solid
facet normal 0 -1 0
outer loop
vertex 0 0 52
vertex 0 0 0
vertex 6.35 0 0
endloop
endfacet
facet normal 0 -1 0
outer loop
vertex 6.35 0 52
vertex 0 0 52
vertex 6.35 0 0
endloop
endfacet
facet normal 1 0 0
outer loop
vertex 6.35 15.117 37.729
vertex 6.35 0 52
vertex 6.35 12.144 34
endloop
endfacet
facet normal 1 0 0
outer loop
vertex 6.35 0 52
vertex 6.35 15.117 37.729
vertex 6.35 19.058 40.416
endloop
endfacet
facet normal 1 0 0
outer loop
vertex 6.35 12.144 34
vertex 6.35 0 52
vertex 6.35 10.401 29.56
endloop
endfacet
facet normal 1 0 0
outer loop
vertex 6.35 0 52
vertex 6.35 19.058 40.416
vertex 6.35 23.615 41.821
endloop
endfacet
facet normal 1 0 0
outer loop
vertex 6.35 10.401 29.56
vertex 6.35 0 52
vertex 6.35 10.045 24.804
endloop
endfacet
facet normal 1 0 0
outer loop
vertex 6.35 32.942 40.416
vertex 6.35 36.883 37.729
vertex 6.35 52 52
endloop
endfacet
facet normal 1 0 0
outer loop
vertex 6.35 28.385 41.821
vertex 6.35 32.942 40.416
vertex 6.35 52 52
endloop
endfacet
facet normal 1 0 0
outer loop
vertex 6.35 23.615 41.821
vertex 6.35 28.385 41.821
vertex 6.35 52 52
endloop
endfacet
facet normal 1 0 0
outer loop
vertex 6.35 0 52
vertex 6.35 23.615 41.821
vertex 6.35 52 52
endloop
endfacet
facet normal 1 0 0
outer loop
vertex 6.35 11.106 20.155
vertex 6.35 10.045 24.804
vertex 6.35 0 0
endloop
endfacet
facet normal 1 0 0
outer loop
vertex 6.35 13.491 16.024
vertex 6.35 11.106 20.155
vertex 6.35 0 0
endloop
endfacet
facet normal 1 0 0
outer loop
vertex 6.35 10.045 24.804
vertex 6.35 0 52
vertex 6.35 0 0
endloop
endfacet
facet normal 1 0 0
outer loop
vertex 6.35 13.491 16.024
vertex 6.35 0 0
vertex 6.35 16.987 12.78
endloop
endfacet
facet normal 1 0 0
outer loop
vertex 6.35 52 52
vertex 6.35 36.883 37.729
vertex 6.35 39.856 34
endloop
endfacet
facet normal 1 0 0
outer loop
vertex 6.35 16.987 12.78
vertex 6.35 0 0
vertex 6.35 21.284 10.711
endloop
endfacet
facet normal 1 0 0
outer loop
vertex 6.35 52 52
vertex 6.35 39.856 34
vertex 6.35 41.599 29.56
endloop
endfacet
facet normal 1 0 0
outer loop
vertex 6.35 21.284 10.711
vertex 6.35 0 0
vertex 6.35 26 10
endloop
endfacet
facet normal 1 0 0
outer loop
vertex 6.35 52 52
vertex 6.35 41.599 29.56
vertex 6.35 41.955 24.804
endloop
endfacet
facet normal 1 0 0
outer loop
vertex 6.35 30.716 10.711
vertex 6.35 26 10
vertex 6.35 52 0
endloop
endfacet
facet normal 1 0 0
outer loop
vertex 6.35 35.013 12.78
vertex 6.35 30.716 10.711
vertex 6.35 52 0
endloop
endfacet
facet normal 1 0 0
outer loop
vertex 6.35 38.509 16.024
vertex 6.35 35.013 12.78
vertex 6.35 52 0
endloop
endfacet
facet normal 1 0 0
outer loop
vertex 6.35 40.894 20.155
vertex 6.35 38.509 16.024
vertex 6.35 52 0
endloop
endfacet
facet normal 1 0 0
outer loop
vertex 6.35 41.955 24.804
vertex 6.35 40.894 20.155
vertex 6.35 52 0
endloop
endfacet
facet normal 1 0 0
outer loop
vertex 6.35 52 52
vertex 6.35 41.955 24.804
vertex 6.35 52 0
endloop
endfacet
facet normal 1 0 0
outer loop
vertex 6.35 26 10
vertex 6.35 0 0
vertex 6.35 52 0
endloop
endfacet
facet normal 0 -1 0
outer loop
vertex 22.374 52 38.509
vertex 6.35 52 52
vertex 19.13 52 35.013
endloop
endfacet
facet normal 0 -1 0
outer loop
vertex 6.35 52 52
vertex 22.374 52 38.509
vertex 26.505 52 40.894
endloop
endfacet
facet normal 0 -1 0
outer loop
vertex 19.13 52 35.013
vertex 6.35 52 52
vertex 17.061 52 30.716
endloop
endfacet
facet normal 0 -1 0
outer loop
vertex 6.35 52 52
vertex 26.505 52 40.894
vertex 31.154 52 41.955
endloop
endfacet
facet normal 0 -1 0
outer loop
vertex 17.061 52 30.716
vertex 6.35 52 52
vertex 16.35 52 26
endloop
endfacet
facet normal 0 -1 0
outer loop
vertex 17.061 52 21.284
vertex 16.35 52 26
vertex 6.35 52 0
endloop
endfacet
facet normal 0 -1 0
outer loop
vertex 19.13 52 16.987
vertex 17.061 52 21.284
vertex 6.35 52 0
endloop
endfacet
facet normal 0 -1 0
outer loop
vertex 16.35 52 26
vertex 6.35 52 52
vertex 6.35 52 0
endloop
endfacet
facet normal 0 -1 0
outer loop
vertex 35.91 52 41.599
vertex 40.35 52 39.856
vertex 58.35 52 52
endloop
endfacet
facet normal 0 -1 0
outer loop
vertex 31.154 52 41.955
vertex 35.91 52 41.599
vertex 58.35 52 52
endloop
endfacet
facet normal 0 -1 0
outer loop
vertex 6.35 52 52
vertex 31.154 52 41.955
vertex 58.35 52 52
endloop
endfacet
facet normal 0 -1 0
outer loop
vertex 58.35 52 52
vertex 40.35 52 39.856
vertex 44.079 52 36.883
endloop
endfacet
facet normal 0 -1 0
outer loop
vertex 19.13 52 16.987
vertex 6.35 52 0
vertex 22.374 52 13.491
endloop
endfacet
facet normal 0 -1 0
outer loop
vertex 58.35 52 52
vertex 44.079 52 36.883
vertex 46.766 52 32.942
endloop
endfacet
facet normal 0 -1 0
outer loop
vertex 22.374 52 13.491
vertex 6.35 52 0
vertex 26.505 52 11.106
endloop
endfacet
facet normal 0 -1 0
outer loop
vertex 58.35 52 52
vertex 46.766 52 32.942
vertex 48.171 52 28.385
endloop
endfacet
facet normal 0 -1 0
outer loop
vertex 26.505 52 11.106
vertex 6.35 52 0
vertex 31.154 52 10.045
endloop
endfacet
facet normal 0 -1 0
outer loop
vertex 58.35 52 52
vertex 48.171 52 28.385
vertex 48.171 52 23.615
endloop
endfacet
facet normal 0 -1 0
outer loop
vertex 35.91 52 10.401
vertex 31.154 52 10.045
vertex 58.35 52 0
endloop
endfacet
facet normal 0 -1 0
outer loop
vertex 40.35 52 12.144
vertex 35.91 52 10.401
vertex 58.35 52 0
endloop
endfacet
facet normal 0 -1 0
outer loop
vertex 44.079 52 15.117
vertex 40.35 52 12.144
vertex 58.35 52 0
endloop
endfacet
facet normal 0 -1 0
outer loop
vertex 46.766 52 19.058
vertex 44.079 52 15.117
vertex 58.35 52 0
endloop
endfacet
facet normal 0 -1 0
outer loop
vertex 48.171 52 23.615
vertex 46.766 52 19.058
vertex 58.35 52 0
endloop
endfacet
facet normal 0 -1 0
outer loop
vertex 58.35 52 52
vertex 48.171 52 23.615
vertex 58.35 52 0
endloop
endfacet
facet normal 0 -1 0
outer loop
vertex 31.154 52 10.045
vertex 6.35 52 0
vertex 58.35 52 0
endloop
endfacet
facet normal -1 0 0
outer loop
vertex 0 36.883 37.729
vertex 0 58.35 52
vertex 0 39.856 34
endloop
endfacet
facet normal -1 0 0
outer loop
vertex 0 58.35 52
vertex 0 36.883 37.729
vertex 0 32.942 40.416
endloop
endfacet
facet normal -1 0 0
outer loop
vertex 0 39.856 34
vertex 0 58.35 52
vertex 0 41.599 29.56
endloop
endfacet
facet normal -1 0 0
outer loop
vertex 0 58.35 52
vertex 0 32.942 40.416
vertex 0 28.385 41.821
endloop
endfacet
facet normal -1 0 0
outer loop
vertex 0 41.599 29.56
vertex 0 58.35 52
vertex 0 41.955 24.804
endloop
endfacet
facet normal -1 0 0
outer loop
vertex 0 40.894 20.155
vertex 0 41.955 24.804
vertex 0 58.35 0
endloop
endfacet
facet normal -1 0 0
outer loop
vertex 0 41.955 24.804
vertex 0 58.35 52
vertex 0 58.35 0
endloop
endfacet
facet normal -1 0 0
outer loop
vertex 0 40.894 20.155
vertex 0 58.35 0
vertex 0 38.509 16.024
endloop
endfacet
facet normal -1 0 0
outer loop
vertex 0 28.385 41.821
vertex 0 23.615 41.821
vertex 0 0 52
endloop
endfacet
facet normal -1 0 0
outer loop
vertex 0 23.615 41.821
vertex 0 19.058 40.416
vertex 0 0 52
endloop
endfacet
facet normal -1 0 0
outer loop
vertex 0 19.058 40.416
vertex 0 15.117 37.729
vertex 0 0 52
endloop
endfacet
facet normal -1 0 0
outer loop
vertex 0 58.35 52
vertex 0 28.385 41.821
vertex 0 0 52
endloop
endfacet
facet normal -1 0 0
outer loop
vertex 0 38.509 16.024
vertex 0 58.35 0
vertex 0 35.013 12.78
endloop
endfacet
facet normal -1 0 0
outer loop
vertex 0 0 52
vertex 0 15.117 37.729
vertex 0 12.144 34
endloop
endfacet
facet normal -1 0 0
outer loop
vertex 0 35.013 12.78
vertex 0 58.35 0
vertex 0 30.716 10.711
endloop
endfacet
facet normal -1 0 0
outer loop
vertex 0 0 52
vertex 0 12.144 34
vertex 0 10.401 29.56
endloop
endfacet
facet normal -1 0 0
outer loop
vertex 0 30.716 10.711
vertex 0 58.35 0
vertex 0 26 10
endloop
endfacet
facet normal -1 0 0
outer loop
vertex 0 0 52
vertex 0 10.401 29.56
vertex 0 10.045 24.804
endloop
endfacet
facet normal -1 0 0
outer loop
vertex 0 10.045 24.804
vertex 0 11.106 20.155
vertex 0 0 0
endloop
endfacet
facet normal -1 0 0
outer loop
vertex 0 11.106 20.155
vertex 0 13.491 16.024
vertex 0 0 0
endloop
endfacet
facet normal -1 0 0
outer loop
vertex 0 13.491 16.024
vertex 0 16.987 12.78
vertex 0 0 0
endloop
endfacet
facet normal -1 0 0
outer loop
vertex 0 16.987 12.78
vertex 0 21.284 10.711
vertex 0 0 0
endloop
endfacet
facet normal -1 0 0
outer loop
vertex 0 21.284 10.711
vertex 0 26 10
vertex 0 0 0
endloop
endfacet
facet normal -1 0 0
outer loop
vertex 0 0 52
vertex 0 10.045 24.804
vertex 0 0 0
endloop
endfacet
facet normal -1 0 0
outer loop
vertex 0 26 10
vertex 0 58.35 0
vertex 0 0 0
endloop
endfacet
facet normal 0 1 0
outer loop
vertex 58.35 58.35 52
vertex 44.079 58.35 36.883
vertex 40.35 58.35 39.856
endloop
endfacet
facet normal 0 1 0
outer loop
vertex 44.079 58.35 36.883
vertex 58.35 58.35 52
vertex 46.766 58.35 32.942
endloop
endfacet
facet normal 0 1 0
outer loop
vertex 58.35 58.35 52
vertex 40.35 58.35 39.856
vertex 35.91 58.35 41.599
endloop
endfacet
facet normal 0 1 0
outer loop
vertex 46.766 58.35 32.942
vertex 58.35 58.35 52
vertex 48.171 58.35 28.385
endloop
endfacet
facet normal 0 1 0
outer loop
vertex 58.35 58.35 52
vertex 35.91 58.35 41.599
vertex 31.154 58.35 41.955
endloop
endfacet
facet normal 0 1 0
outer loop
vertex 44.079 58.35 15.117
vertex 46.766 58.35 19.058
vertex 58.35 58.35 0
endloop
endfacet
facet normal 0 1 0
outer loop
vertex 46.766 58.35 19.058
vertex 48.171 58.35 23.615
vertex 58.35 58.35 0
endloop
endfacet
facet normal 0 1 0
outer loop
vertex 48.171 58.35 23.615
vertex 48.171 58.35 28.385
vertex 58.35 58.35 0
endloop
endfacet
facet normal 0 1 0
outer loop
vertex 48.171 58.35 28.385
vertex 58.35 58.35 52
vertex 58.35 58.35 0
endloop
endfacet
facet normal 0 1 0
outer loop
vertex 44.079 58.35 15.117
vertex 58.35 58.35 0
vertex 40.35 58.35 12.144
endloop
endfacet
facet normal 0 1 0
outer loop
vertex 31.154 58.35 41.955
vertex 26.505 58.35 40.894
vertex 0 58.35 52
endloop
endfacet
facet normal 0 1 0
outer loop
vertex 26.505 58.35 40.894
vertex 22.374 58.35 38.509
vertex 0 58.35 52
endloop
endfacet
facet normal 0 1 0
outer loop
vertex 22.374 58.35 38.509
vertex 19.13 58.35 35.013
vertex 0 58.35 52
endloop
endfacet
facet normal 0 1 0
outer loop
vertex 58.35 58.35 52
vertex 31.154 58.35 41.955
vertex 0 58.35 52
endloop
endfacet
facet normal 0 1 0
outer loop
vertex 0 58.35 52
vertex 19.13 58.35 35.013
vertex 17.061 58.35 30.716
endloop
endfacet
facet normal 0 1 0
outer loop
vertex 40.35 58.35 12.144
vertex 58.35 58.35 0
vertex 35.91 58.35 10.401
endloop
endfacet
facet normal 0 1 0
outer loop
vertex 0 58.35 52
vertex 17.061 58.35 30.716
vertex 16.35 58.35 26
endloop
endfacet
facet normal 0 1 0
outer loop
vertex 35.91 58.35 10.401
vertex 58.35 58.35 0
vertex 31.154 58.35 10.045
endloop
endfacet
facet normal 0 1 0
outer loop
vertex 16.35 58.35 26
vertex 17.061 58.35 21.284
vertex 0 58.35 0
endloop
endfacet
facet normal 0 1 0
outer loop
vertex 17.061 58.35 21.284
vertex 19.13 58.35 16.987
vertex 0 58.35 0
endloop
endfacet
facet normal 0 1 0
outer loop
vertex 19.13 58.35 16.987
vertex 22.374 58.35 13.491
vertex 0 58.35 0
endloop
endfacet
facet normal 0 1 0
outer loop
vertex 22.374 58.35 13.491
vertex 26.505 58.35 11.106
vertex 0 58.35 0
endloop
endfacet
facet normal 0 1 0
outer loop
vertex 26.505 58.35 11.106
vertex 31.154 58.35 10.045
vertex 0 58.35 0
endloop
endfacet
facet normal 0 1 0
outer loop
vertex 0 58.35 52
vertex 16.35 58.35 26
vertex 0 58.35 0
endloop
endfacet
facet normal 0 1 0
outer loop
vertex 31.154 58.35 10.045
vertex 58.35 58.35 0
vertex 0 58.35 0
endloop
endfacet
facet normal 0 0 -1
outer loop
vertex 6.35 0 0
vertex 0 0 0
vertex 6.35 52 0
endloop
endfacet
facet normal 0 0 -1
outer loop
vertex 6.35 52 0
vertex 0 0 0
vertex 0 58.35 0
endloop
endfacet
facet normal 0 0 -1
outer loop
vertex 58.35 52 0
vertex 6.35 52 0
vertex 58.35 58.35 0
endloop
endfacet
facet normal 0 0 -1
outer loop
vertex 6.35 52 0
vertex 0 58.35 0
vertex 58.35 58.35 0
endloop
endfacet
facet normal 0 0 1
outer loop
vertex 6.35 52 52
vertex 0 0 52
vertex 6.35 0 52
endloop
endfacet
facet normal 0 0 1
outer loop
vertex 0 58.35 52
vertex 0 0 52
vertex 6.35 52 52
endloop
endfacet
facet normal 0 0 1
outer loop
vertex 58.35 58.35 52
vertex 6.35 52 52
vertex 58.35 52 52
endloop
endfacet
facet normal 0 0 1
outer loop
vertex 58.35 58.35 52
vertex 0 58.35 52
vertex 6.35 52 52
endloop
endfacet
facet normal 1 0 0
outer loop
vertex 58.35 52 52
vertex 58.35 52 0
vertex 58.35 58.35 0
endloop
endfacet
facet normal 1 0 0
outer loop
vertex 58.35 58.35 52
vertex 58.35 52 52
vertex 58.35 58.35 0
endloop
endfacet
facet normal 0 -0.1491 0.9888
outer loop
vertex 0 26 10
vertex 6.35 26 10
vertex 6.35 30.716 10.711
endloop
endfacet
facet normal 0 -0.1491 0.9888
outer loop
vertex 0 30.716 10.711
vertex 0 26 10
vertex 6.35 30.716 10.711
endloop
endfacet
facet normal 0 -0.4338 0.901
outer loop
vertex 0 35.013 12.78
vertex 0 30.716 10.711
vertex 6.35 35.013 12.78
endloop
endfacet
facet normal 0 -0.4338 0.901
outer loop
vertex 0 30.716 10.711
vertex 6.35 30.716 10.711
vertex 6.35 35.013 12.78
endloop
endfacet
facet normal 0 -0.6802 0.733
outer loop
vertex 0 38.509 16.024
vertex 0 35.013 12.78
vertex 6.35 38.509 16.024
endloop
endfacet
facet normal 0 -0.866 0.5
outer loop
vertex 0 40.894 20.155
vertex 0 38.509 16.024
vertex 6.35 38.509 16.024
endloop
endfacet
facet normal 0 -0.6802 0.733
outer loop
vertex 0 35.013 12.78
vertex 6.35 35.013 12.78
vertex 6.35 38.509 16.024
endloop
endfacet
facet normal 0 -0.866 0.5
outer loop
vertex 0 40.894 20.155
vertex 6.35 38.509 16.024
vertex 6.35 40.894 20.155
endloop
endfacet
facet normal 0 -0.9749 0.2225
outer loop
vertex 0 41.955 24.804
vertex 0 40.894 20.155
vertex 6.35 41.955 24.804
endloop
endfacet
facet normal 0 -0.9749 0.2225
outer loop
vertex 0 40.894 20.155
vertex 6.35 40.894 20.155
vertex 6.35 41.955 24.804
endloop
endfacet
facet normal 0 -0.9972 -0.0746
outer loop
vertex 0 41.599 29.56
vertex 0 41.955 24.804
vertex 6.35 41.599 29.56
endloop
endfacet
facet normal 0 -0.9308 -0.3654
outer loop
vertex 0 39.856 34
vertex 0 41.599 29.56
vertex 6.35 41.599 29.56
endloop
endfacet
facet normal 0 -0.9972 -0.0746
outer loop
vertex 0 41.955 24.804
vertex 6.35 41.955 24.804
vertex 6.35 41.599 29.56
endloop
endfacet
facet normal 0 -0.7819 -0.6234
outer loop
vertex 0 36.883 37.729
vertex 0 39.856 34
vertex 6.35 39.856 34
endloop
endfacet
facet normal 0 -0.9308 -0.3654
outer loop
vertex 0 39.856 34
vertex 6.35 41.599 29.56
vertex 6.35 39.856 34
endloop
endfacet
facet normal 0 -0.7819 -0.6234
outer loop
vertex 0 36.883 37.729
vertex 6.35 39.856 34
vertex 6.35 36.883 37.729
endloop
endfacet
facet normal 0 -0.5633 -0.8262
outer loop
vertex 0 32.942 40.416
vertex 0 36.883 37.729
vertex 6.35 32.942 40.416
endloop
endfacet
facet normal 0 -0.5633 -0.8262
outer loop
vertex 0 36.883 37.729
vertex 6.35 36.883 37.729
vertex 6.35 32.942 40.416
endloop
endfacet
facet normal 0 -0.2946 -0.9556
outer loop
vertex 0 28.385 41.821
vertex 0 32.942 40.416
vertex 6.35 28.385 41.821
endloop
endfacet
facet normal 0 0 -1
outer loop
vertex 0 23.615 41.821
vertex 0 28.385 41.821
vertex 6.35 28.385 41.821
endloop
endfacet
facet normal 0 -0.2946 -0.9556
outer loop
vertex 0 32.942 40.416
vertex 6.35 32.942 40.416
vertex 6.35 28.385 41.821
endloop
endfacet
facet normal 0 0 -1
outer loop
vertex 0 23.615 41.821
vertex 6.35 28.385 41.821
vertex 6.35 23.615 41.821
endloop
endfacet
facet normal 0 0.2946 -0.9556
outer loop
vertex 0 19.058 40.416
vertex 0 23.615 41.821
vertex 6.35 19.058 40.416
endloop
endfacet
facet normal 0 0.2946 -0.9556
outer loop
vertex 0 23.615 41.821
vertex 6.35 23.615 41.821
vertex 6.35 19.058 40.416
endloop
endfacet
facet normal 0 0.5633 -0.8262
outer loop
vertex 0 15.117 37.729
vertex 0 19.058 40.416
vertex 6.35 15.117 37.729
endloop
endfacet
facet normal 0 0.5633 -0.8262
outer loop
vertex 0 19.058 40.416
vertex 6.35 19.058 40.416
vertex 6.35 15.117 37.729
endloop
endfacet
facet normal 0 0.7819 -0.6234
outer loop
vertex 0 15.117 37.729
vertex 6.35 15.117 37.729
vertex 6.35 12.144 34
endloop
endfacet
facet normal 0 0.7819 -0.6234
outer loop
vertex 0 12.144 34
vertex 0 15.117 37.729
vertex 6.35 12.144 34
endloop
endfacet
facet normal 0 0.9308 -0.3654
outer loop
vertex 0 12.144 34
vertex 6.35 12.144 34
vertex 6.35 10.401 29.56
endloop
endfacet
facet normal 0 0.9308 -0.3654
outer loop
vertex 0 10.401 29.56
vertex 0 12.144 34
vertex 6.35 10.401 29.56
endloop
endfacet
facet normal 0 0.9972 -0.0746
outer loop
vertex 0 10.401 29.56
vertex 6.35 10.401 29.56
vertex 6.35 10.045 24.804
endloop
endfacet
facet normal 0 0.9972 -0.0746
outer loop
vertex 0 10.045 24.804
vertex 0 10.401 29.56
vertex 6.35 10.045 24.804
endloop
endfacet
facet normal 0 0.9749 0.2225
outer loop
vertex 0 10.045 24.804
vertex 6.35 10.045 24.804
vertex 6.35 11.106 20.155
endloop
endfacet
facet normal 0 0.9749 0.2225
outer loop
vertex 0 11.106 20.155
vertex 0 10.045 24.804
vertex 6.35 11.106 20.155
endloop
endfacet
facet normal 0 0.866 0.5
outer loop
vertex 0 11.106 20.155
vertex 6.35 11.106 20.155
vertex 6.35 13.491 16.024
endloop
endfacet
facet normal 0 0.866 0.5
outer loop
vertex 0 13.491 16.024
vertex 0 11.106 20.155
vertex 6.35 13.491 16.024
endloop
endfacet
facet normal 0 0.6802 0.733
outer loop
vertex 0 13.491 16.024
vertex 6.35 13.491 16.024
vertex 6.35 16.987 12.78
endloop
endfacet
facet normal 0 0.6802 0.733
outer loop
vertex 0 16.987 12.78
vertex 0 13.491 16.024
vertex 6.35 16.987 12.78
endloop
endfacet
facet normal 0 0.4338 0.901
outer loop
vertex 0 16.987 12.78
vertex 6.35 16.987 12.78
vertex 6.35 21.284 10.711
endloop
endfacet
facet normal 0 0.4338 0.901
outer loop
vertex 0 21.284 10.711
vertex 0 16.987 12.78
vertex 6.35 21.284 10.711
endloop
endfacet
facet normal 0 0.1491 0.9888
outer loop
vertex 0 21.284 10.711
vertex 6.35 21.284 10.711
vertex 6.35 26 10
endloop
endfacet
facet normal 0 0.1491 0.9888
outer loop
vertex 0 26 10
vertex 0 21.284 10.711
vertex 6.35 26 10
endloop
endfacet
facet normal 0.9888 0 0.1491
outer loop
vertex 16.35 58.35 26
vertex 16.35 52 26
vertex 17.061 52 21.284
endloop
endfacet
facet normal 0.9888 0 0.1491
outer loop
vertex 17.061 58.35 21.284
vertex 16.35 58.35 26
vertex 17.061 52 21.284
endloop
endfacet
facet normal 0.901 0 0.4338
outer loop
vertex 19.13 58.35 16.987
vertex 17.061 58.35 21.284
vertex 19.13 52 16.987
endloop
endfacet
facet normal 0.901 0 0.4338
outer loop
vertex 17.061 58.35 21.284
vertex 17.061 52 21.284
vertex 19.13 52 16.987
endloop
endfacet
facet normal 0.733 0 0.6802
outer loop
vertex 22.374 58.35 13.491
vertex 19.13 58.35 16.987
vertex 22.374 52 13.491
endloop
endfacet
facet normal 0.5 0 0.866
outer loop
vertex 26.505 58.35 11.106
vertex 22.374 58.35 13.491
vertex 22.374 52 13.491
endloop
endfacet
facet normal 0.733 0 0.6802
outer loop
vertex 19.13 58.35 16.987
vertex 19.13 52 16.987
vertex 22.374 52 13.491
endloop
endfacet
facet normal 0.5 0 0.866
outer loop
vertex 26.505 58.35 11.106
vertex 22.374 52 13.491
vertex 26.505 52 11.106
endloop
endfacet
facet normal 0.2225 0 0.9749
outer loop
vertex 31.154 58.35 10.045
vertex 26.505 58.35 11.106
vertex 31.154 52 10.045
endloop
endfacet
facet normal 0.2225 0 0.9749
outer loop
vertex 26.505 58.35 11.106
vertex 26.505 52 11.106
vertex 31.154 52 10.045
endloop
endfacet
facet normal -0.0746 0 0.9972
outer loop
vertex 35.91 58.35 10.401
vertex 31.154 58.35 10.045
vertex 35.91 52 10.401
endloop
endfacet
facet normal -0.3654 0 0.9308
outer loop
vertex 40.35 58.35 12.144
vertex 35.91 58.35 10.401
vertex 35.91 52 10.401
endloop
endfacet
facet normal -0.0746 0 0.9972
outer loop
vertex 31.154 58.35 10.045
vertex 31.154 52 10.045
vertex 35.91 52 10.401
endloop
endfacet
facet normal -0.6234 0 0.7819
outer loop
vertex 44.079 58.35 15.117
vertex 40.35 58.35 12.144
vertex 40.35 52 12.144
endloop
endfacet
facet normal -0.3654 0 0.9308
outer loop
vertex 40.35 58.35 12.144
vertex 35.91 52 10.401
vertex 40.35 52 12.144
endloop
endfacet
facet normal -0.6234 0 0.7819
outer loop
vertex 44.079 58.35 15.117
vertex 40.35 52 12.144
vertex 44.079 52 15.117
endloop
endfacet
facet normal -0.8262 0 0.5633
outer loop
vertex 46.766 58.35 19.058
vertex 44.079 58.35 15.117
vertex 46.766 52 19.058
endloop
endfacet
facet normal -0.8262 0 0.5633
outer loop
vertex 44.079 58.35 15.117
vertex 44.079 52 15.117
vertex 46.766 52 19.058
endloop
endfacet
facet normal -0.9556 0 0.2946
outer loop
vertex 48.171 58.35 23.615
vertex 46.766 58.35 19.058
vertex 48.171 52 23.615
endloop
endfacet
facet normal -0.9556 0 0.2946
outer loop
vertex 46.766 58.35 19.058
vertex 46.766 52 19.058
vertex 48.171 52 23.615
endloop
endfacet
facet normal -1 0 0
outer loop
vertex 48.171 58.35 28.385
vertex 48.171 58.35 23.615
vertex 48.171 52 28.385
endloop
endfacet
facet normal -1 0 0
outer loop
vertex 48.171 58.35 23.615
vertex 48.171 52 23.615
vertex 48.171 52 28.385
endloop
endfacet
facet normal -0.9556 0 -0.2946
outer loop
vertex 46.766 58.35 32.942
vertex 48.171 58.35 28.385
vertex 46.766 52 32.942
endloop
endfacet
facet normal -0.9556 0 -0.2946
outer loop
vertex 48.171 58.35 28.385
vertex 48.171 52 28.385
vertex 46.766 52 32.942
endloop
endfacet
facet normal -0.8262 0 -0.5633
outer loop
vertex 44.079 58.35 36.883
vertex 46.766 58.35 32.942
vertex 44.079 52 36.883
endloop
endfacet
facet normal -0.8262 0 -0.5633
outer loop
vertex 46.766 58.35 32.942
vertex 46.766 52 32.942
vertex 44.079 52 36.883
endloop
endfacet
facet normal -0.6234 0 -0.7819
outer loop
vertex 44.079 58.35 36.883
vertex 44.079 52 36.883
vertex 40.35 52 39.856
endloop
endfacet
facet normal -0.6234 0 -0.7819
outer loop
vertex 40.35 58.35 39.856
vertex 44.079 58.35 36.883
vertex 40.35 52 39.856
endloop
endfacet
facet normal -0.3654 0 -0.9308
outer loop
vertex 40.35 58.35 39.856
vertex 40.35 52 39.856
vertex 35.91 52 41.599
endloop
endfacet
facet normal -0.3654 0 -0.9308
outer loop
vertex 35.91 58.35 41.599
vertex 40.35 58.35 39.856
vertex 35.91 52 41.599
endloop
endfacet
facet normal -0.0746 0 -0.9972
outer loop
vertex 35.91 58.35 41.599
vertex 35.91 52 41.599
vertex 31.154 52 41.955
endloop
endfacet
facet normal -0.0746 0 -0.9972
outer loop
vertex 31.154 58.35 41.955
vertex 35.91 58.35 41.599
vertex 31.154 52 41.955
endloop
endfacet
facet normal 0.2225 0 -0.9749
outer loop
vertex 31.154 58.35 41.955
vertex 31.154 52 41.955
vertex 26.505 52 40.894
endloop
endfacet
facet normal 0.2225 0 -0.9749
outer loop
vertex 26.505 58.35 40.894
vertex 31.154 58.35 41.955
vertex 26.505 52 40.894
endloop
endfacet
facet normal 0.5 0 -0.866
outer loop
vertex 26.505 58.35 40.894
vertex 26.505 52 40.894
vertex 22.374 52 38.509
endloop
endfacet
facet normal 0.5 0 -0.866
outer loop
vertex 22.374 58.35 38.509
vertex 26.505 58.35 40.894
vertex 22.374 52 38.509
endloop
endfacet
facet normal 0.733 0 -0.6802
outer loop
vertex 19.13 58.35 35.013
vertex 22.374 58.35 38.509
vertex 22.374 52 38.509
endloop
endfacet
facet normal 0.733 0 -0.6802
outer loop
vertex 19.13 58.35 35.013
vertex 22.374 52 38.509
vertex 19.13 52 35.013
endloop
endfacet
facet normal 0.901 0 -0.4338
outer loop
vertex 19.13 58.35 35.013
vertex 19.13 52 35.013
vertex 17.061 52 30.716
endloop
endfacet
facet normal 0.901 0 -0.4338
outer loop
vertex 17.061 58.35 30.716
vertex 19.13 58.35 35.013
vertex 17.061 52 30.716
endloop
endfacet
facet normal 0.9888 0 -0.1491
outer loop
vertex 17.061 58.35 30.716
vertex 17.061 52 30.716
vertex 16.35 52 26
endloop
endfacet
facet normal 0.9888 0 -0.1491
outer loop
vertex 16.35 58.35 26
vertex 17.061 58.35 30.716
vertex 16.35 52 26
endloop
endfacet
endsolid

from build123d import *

# Parameters (mm, degrees)
BOSS_EXTRUDE1_DEPTH = 52
SKETCH2_R           = 16
CUT_EXTRUDE1_DEPTH  = 52
SKETCH3_R           = 16
CUT_EXTRUDE2_DEPTH  = 52


with BuildPart() as part:
    # Sketch1 → Boss-Extrude1 (new body)
    with BuildSketch(Plane.XY):
        Polygon((0, 0), (6.35, 0), (6.35, 52), (58.35, 52), (58.35, 58.35), (0, 58.35), (0, 32.973080538), align=None)
    extrude(amount=BOSS_EXTRUDE1_DEPTH)

    # Sketch2 → Cut-Extrude1 (cut)
    with BuildSketch(Plane(origin=(0, 52, 0), x_dir=(-1, 0, 0), z_dir=(0, -1, 0))):
        with Locations((-32.35, -26)):
            Circle(SKETCH2_R)
    extrude(amount=-CUT_EXTRUDE1_DEPTH, mode=Mode.SUBTRACT)

    # Sketch3 → Cut-Extrude2 (cut)
    with BuildSketch(Plane(origin=(6.35, 0, 0), x_dir=(0, 0, -1), z_dir=(1, 0, 0))):
        with Locations((-26, 26)):
            Circle(SKETCH3_R)
    extrude(amount=-CUT_EXTRUDE2_DEPTH, mode=Mode.SUBTRACT)


solid = part.part
